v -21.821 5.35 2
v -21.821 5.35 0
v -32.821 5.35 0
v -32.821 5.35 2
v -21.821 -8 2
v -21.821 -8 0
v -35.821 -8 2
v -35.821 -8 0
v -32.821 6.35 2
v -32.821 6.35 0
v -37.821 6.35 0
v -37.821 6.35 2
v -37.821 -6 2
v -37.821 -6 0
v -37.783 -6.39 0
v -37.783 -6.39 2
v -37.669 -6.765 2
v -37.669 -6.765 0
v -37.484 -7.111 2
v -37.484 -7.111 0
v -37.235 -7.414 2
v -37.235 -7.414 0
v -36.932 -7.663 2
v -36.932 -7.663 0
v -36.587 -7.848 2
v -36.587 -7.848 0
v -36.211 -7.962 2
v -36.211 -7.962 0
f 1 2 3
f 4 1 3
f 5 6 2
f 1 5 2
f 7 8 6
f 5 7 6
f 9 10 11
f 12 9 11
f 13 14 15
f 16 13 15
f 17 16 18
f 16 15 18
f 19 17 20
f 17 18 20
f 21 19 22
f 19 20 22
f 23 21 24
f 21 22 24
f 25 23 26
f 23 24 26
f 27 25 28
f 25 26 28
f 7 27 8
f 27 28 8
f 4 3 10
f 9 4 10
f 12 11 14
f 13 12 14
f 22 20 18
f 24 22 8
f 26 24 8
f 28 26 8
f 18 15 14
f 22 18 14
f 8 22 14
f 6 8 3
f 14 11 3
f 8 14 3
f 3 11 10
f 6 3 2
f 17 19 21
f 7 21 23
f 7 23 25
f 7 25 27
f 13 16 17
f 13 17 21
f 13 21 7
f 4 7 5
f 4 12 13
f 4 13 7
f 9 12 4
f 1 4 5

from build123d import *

# Parameters (mm, degrees)
BOSS_EXTRUDE1_DEPTH = 2


with BuildPart() as part:
    # Sketch1 → Boss-Extrude1 (new body)
    with BuildSketch(Plane.XY):
        with BuildLine():
            Line((-37.821244, 0.214456948), (-37.821244, 0))
            Line((-37.821244, 0), (-37.821244, -6))
            ThreePointArc((-37.821244, -6), (-37.235457562, -7.414213562), (-35.821244, -8))
            Line((-35.821244, -8), (-21.821244, -8))
            Line((-21.821244, -8), (-21.821244, 5.35))
            Line((-21.821244, 5.35), (-32.821244, 5.35))
            Line((-32.821244, 5.35), (-32.821244, 6.35))
            Line((-32.821244, 6.35), (-37.821244, 6.35))
            Line((-37.821244, 6.35), (-37.821244, 4))
            Line((-37.821244, 4), (-37.821244, 1))
            Line((-37.821244, 1), (-37.821244, 0.587709258))
            Line((-37.821244, 0.587709258), (-37.821244, 0.214456948))
        make_face()
    extrude(amount=BOSS_EXTRUDE1_DEPTH)


solid = part.part
